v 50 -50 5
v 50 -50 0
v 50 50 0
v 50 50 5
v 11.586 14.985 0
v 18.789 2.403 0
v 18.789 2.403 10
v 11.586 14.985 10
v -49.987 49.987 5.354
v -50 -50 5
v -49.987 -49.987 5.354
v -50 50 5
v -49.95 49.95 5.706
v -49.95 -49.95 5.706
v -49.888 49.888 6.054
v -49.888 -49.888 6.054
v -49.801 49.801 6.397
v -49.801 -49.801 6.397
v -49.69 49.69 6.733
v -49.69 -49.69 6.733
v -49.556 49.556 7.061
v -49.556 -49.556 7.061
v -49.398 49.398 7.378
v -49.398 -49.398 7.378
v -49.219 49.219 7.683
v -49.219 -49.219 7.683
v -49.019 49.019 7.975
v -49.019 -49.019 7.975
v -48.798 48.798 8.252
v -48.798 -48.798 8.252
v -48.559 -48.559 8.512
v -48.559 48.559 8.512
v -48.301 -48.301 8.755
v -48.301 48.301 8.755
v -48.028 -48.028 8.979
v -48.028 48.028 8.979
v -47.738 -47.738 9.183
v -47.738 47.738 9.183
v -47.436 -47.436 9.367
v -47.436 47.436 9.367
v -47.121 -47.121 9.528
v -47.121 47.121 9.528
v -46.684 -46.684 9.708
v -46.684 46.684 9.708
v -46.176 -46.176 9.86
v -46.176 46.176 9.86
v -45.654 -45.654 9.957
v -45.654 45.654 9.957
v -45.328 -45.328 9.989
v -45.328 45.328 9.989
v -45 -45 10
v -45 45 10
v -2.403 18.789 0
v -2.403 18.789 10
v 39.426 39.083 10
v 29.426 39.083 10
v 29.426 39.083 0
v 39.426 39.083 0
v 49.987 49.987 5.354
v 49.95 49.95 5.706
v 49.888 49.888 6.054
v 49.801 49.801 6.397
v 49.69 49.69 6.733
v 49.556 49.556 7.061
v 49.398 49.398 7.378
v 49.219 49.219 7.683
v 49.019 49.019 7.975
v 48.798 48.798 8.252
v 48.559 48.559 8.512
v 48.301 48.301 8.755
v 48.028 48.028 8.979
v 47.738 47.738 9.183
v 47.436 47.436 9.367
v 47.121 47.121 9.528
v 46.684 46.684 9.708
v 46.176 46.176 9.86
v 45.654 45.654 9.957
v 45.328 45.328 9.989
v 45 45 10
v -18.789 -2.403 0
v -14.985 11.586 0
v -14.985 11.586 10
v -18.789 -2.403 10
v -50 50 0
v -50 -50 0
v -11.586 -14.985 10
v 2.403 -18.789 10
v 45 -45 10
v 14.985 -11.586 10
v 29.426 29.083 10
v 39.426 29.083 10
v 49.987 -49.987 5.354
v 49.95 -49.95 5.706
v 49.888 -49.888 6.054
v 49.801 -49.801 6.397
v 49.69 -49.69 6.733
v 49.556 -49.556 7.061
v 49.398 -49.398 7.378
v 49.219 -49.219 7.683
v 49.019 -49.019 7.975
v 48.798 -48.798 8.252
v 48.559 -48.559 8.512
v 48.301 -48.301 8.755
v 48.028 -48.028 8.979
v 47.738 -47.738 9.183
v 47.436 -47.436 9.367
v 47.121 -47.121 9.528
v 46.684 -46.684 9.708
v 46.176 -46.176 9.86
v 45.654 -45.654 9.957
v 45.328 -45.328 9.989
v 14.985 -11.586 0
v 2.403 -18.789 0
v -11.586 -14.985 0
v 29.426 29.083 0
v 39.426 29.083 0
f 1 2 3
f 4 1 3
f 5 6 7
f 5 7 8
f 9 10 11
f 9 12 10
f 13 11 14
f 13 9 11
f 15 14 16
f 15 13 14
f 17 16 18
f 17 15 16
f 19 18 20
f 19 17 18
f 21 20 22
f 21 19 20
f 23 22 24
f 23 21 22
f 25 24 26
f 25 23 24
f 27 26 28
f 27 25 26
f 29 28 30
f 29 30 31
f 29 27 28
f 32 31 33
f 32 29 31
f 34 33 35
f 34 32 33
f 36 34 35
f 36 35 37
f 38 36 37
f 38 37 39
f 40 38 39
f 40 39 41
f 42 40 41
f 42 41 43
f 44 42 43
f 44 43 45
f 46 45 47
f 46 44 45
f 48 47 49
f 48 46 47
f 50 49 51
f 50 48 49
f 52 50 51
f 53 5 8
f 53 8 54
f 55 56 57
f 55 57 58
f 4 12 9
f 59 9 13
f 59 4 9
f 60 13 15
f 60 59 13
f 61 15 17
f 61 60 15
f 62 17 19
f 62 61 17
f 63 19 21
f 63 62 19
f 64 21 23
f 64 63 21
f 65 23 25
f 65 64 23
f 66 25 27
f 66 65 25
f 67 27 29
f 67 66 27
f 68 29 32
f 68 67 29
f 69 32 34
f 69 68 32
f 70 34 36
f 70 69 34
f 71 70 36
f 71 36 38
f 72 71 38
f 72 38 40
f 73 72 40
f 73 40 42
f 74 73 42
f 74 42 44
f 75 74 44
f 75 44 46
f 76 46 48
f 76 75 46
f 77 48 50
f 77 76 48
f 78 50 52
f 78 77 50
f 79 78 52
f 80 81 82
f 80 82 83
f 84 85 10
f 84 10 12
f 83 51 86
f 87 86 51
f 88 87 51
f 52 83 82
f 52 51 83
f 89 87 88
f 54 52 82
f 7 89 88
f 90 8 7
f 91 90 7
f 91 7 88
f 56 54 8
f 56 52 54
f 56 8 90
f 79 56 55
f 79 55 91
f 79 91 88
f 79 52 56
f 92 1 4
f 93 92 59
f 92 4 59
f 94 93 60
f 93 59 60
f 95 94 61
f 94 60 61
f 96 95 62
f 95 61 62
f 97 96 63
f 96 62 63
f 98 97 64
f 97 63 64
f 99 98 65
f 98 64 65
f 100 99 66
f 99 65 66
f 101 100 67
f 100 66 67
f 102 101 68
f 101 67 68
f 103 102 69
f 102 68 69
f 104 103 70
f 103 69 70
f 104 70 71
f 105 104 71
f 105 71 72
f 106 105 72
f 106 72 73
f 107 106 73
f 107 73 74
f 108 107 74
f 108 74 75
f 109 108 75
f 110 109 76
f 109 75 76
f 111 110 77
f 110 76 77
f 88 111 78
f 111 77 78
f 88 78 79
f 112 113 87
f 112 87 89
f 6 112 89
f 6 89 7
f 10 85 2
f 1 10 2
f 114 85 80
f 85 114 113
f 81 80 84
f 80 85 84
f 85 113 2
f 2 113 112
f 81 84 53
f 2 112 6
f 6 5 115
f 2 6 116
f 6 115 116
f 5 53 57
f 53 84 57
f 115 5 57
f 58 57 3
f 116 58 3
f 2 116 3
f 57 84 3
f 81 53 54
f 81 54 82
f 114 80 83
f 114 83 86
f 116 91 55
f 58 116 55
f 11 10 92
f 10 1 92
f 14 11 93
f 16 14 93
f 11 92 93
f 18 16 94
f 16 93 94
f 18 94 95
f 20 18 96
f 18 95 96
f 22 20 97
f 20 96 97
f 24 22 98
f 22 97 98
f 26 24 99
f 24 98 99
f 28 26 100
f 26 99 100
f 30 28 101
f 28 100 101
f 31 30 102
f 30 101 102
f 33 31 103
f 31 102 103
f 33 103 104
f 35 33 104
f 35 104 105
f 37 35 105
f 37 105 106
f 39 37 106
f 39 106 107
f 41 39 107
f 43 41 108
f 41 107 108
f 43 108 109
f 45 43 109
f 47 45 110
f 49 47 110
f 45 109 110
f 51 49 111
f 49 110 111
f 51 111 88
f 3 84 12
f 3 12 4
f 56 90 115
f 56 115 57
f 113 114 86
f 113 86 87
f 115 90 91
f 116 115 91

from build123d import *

# Parameters (mm, degrees)
F0_W     = 100
F0_H     = 100
F2_DEPTH = 10
F3_R     = 5
F4_DEPTH = 106.8
F5_W     = 10
F5_H     = 10
F6_DEPTH = 90.6


with BuildPart() as f2:
    # F0 (on Top) → F2 (new body)
    with BuildSketch(Plane.XY):
        Rectangle(F0_W, F0_H)
    extrude(amount=F2_DEPTH)

    # F3
    f3_edges = [f2.edges().sort_by_distance(p)[0] for p in [
        (50, 0, 10),
        (0, 50, 10),
        (-50, 0, 10),
        (0, -50, 10),
    ]]
    fillet(f3_edges, radius=F3_R)

    # F1 (on face) → F4 (cut)
    with BuildSketch(Plane.XY):
        Polygon((18.788767, 2.403422), (11.586189, 14.98514), (-2.403422, 18.788767), (-14.98514, 11.586189), (-18.788767, -2.403422), (-11.586189, -14.98514), (2.403422, -18.788767), (14.98514, -11.586189), align=None)
    extrude(amount=F4_DEPTH, mode=Mode.SUBTRACT)

    # F5 (on face) → F6 (cut)
    with BuildSketch(Plane.XY.offset(10)):
        with Locations((34.426235, 34.082789)):
            Rectangle(F5_W, F5_H)
    extrude(amount=-F6_DEPTH, mode=Mode.SUBTRACT)


solid = f2.part
